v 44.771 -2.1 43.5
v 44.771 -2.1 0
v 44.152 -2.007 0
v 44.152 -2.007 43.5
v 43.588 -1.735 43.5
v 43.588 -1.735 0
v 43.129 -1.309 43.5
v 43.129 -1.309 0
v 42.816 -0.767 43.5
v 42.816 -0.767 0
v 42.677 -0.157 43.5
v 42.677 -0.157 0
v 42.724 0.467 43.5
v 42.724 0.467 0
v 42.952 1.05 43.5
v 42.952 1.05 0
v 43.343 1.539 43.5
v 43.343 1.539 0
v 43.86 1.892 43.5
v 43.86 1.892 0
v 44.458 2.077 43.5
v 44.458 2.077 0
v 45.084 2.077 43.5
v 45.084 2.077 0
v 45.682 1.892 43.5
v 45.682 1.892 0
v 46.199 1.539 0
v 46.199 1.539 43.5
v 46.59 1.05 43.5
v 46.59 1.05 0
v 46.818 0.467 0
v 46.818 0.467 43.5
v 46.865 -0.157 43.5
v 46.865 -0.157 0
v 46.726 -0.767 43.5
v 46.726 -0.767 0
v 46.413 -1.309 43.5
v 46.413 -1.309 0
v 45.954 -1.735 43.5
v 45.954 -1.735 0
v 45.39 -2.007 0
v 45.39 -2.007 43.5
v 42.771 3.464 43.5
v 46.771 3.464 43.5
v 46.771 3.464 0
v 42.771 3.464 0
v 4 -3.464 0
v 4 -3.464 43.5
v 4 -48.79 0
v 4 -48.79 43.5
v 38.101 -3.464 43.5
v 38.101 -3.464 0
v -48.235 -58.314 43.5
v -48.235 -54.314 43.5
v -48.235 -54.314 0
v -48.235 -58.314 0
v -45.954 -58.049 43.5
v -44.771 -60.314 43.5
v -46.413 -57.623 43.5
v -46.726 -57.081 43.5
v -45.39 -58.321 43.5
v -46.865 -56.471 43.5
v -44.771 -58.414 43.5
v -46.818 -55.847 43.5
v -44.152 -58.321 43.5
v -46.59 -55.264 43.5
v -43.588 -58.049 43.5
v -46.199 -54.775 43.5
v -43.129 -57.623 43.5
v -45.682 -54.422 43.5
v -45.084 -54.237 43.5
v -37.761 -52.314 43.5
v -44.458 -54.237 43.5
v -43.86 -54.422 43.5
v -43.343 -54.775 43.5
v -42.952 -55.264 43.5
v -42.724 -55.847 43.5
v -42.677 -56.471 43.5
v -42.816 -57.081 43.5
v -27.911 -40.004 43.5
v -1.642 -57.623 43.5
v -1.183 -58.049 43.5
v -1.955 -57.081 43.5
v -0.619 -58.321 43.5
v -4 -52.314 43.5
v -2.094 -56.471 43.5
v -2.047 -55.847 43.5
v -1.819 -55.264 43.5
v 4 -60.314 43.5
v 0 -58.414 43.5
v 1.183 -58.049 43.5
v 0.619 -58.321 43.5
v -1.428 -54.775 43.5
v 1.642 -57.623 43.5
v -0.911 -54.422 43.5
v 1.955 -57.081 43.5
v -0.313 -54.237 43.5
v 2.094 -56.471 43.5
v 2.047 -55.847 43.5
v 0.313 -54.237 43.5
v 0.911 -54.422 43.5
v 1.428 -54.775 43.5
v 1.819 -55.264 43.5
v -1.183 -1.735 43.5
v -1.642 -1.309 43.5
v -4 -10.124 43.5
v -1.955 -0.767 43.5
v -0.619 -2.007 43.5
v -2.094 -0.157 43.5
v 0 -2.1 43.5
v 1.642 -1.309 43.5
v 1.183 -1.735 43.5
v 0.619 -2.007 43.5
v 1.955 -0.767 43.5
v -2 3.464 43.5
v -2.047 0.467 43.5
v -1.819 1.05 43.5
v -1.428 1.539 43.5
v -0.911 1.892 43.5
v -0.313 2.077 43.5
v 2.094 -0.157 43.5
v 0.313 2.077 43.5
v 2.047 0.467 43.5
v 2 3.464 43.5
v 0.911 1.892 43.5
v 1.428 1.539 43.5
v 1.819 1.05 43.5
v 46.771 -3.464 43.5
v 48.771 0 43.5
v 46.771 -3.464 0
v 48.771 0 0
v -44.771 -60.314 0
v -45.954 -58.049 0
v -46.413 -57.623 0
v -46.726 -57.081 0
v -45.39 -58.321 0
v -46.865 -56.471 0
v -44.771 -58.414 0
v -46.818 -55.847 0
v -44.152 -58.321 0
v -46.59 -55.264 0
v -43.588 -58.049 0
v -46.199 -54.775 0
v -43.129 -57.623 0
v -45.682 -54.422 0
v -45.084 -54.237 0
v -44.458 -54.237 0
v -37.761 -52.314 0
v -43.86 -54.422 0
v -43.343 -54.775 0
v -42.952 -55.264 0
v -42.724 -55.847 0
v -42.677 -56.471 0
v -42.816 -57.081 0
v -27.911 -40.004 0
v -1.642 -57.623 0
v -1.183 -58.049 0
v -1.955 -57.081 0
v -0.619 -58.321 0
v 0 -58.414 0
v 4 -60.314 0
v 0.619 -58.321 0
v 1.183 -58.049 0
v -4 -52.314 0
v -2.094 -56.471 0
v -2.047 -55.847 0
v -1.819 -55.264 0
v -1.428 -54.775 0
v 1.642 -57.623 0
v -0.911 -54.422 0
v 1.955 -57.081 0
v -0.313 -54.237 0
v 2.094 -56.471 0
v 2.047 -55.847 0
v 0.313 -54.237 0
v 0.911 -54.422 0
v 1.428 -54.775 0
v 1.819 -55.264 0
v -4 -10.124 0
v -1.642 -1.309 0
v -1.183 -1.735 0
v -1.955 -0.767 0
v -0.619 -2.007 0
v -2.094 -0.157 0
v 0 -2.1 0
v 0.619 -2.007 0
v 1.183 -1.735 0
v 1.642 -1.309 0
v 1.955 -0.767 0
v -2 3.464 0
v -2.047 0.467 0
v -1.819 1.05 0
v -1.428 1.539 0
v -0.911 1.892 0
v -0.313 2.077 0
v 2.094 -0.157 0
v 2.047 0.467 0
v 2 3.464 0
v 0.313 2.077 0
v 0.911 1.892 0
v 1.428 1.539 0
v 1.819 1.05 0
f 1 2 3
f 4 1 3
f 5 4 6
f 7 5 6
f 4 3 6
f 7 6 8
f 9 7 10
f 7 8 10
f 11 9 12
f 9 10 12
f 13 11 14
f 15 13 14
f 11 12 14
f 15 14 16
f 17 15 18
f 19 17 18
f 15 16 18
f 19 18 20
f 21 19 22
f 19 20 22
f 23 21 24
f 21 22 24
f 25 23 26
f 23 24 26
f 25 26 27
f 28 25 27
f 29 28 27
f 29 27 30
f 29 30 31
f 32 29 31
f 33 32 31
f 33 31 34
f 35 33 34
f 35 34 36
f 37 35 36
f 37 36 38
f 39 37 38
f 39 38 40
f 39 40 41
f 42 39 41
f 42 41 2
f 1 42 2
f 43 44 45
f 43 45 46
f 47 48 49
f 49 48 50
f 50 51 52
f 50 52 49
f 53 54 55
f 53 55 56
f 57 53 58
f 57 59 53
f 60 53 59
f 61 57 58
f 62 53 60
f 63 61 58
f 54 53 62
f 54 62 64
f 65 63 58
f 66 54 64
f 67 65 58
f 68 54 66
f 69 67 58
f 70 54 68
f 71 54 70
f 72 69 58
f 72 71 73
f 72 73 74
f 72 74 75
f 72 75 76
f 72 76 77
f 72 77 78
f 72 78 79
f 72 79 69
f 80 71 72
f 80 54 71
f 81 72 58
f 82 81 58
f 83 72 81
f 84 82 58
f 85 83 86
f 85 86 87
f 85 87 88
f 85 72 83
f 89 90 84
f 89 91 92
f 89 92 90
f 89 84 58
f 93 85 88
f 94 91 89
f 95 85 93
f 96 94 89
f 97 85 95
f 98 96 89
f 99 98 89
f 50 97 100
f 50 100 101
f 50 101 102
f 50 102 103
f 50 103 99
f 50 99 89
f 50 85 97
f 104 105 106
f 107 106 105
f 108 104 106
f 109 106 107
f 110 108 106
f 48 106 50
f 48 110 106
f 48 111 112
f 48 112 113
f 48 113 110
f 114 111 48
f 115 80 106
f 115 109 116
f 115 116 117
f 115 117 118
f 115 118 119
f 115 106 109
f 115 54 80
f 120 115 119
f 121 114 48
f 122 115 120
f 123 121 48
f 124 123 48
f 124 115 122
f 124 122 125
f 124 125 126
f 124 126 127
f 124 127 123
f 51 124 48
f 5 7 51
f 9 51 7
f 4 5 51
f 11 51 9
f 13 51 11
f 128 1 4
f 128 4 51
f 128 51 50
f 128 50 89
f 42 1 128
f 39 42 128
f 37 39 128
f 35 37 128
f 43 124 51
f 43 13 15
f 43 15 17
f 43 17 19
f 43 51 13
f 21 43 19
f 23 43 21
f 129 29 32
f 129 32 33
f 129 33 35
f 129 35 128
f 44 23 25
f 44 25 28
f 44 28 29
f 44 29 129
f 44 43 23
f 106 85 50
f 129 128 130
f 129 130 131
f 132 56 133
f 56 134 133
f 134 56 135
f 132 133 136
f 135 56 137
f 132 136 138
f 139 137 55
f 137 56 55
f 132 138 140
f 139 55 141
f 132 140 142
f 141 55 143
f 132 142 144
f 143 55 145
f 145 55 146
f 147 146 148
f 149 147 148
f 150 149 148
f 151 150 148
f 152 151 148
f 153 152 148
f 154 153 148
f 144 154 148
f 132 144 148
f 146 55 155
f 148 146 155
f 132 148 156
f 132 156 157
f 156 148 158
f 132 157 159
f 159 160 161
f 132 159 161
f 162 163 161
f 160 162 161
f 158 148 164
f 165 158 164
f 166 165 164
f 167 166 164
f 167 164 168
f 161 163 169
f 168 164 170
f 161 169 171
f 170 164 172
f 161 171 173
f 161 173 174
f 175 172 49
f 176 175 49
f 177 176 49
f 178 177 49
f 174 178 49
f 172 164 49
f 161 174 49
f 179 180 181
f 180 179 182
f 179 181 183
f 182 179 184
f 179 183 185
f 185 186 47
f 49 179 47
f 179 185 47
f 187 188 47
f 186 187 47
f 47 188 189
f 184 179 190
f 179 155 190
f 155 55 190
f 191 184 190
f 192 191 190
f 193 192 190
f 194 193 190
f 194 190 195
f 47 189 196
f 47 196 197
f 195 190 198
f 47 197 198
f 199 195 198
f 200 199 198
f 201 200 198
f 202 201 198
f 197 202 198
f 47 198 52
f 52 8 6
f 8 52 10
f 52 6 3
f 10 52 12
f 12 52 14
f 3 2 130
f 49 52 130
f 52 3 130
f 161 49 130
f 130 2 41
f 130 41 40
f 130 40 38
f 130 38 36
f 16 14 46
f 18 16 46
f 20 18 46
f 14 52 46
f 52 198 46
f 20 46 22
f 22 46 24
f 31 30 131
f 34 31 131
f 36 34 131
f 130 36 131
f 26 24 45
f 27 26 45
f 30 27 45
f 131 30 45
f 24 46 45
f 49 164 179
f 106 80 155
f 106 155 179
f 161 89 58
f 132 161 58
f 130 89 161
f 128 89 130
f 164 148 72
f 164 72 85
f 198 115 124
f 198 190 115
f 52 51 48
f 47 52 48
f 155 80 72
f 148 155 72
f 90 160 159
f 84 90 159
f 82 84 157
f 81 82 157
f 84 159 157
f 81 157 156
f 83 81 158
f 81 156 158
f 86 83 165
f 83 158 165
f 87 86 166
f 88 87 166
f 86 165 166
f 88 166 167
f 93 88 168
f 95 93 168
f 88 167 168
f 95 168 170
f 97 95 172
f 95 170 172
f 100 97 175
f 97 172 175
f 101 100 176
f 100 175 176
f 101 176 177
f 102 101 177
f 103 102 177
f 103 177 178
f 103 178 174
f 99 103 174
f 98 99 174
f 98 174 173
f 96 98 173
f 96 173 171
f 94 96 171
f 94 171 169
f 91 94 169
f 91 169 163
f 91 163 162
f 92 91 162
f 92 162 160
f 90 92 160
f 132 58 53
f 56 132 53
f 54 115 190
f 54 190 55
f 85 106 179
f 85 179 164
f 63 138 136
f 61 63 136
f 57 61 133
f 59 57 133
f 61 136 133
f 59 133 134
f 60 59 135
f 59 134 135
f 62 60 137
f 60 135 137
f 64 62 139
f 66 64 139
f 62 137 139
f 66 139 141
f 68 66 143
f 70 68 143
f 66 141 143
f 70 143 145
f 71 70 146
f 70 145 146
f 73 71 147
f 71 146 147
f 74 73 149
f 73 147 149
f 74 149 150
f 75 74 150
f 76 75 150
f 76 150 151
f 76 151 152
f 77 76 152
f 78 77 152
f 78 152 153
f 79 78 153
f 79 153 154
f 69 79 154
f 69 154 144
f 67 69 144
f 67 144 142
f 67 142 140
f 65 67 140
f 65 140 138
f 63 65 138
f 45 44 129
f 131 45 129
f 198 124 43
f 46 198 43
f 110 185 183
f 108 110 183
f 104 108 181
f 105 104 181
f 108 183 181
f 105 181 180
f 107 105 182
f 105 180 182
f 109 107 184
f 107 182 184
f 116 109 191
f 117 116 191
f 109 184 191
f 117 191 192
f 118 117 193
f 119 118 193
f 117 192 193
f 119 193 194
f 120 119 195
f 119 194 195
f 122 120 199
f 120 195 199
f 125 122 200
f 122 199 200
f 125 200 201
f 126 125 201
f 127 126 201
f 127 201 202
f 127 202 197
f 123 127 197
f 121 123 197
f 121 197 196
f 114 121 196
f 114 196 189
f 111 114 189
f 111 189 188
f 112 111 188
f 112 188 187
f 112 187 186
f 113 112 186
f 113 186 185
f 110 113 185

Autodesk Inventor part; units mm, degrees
sketch "Sketch2" plane through (0, 0, 0) normal (0, 0, 1) x (1, 0, 0)
  line L0 (0, 2.8582) -> (0, -2.8582) construction
  line L1 (-5.7775, 0) -> (5.7775, 0) construction
  line L2 (0, 0) -> (4, 0)
  line L3 (4, 0) -> (-4, 0)
  circle A0 centre (0, 0) radius 4
  line L4 (0, 0) -> (-2, 3.4641)
  line L5 (0, 0) -> (4, 0) construction
  line L6 (0, 0) -> (2, 3.4641)
  line L7 (0, 0) -> (4, 0) construction
  line L8 (0, 0) -> (4, 0)
  line L9 (0, 0) -> (2, -3.4641)
  line L10 (0, 0) -> (-2, -3.4641)
  line L11 (-2, 3.4641) -> (2, 3.4641)
  line L12 (2, 3.4641) -> (4, 0)
  line L13 (4, 0) -> (2, -3.4641)
  line L14 (2, -3.4641) -> (-2, -3.4641)
  line L15 (-2, -3.4641) -> (-4, 0)
  line L16 (-4, 0) -> (-2, 3.4641)
  dimension "d3" = 4
  dimension "d2" = 8
  dimension "d1" = 120
  dimension "d0" = 60
extrude "Extrusion1" add sketch "Sketch2" along normal blind 43.5 contours L6 L12 L2 | L10 L15 L3 | L3 L16 L4 | L4 L11 L6 | L2 L13 L9 | L9 L14 L10
sketch "Sketch3" plane through (0, 0, 43.5) normal (0, 0, 1) x (1, 0, 0)
  point P0 (0, 0)
  point P1 (0, 0)
hole "Hole1" at (0, 0, 43.5) direction (0, 0, -1) diameter 4.2 depth 44
sketch "Sketch5" plane through (0, 0, 43.5) normal (0, 0, 1) x (1, 0, 0)
  line L0 (0, 0) -> (0, -56.314)
  line L1 (0, -56.314) -> (4, -56.314)
  line L2 (4, -56.314) -> (2, -59.7781)
  line L3 (2, -59.7781) -> (-2, -59.7781)
  line L4 (-2, -59.7781) -> (-4, -56.314)
  line L5 (0, -56.314) -> (-4, -56.314)
  line L6 (0, -56.314) -> (0, -52.85)
  line L7 (0, -52.85) -> (2, -52.85)
  line L8 (2, -52.85) -> (4, -56.314)
  line L9 (0, -52.85) -> (-2, -52.85)
  line L10 (-2, -52.85) -> (-4, -56.314)
  line L11 (4, 0) -> (4, -56.314)
  line L12 (-4, 0) -> (-2, -3.4641) projected
  line L13 (-4, 0) -> (-4, -56.314)
  line L14 (0, -56.314) -> (-44.771, -56.314)
  line L15 (-44.771, -56.314) -> (-44.771, -60.314)
  line L16 (-44.771, -56.314) -> (-44.771, -52.314)
  line L17 (-44.771, -60.314) -> (-41.307, -58.3138)
  line L18 (-44.771, -52.314) -> (-41.307, -54.3142)
  line L19 (-41.307, -54.3142) -> (-41.307, -58.3138)
  line L20 (-44.771, -60.314) -> (-48.235, -58.3138)
  line L21 (-44.771, -52.314) -> (-48.235, -54.3142)
  line L22 (-48.235, -54.3142) -> (-48.235, -58.3138)
  line L23 (-44.771, -60.314) -> (-0.654, -60.314)
  line L24 (-0.654, -60.314) -> (4, -56.314)
  line L25 (-44.771, -52.314) -> (0, -52.314)
  line L26 (-4, 0) -> (0, -3.4641)
  line L27 (-2, -3.4641) -> (2, -3.4641) projected
  line L28 (0, -3.4641) -> (4, 0)
  line L29 (4, -56.314) -> (4, -60.314)
  line L30 (4, -60.314) -> (-1.654, -60.314)
  point P0 (-4, -52.314)
  point P1 (-0.654, -60.314)
  dimension "d21" = 56.314
  dimension "d22" = 4
  dimension "d23" = 4
  dimension "d24" = 4
  dimension "d25" = 4
  dimension "d26" = 3.4641
  dimension "d27" = 3.464
  dimension "d28" = 2
  dimension "d29" = 2
  dimension "d30" = 44.771
  dimension "d31" = 4
  dimension "d35" = 4
  dimension "d38" = 4
  dimension "d39" = 3.464
  dimension "d40" = 4
  dimension "d41" = 3.464
  dimension "d42" = 4
  dimension "d43" = 4
  dimension "d44" = 3.464
  dimension "d45" = 3.464
extrude "Extrusion2" add sketch "Sketch5" against normal blind 43.5
sketch "Sketch6" plane through (0, 0, 43.5) normal (0, 0, 1) x (1, 0, 0)
  circle A0 centre (0, 0) radius 1.7294 projected
  line L0 (0, 0) -> (0, -56.314)
  line L1 (0, -56.314) -> (-44.771, -56.314)
  line L2 (-4, -52.314) -> (-44.771, -52.314) projected
  dimension "d74" = 44.771
  dimension "d75" = 4
hole "Hole3" at (0, -56.314, 43.5) at (-44.771, -56.314, 43.5) direction (0, 0, -1) diameter 4.2 depth 44
sketch "Sketch8" plane through (0, 0, 43.5) normal (0, 0, 1) x (1, 0, 0)
  circle A0 centre (0, 0) radius 2.1 projected
  line L0 (0, 0) -> (44.771, 0)
  line L1 (44.771, 0) -> (48.771, 0)
  line L2 (44.771, 0) -> (44.771, 3.464)
  line L3 (44.771, 3.464) -> (46.771, 3.464)
  line L4 (46.771, 3.464) -> (48.771, 0)
  line L5 (44.771, 0) -> (44.771, -3.464)
  line L6 (44.771, -3.464) -> (46.771, -3.464)
  line L7 (46.771, -3.464) -> (48.771, 0)
  line L8 (44.771, 0) -> (40.771, 0)
  line L9 (44.771, -3.464) -> (42.771, -3.464)
  line L10 (42.771, -3.464) -> (40.771, 0)
  line L11 (44.771, 3.464) -> (42.771, 3.464)
  line L12 (42.771, 3.464) -> (40.771, 0)
  line L13 (2, 3.4641) -> (-2, 3.4641) projected
  line L14 (2, 3.4641) -> (44.771, 3.464)
  line L15 (44.771, -3.464) -> (4, -3.464)
  line L16 (4, -60.314) -> (4, 0) projected
  line L17 (4, -3.464) -> (2, 3.4641)
  dimension "d62" = 44.771
  dimension "d63" = 4
  dimension "d64" = 3.464
  dimension "d65" = 2
  dimension "d66" = 3.464
  dimension "d67" = 2
  dimension "d68" = 4
  dimension "d69" = 2
  dimension "d70" = 2
extrude "Extrusion3" add sketch "Sketch8" against normal blind 43.5 contours L17 L14 L12 L0 | L0 L16 L17 | L0 L10 L15 L16 | L12 L11 L2 L0 | L0 L5 L9 L10 | L2 L3 L4 L1 | L1 L7 L6 L5
sketch "Sketch9" plane through (0, 0, 43.5) normal (0, 0, 1) x (1, 0, 0)
  line L0 (0, 0) -> (44.771, 0)
  dimension "d73" = 44.771
hole "Hole5" at (44.771, 0, 43.5) direction (0, 0, -1) diameter 4.2 depth 44
sketch "Sketch10" plane through (0, 0, 43.5) normal (0, 0, 1) x (1, 0, 0)
  line L0 (4, -3.464) -> (4, -60.314) projected
  line L1 (46.771, -3.464) -> (4, -3.464) projected
  line L2 (4, -60.314) -> (46.771, -3.464)
  line L3 (21.4983, -3.464) -> (21.4983, 3.4641)
  line L4 (2, 3.4641) -> (46.771, 3.464) projected
  line L5 (43.6374, -7.6291) -> (38.1012, -3.464)
  line L6 (38.1012, -3.464) -> (4, -48.7904)
  line L7 (38.1012, -3.464) -> (38.1012, -3.464)
  line L8 (38.1012, -3.464) -> (46.771, -3.464)
  line L9 (4, -48.7904) -> (4, -60.314)
  line L10 (-2, 3.4641) -> (-4, 0) projected
  line L11 (-48.235, -54.3142) -> (-44.771, -52.314) projected
  line L12 (-2, 3.4641) -> (-48.235, -54.3142)
  line L13 (-33.3199, -35.6753) -> (-27.9106, -40.0039)
  line L14 (-27.9106, -40.0039) -> (-4, -10.1236)
  line L15 (-4, -52.314) -> (-4, 0) projected
  line L16 (2, 3.4641) -> (-2, 3.4641) projected
  line L17 (-4, -10.1236) -> (-2, 3.4641)
  line L18 (-27.9106, -40.0039) -> (-37.7613, -52.314)
  line L19 (-37.7613, -52.314) -> (-48.235, -54.3142)
  point P0 (0, 0)
  dimension "d83" = 6.9281
  dimension "d84" = 6.928
  dimension "d85" = 6.928
  dimension "d86" = 90
  dimension "d87" = 90
  dimension "d88" = 90
  dimension "d89" = 90
  dimension "d90" = 90
extrude "Extrusion4" add sketch "Sketch10" against normal blind 43.5 contours L17 L15 L10 | L10 L15 L14 L13 L12 | L6 L5 L2 L0 | L1 L2 L5 | L13 L18 L19 L12
properties part number "steunstuk driehoek" material "S235"
